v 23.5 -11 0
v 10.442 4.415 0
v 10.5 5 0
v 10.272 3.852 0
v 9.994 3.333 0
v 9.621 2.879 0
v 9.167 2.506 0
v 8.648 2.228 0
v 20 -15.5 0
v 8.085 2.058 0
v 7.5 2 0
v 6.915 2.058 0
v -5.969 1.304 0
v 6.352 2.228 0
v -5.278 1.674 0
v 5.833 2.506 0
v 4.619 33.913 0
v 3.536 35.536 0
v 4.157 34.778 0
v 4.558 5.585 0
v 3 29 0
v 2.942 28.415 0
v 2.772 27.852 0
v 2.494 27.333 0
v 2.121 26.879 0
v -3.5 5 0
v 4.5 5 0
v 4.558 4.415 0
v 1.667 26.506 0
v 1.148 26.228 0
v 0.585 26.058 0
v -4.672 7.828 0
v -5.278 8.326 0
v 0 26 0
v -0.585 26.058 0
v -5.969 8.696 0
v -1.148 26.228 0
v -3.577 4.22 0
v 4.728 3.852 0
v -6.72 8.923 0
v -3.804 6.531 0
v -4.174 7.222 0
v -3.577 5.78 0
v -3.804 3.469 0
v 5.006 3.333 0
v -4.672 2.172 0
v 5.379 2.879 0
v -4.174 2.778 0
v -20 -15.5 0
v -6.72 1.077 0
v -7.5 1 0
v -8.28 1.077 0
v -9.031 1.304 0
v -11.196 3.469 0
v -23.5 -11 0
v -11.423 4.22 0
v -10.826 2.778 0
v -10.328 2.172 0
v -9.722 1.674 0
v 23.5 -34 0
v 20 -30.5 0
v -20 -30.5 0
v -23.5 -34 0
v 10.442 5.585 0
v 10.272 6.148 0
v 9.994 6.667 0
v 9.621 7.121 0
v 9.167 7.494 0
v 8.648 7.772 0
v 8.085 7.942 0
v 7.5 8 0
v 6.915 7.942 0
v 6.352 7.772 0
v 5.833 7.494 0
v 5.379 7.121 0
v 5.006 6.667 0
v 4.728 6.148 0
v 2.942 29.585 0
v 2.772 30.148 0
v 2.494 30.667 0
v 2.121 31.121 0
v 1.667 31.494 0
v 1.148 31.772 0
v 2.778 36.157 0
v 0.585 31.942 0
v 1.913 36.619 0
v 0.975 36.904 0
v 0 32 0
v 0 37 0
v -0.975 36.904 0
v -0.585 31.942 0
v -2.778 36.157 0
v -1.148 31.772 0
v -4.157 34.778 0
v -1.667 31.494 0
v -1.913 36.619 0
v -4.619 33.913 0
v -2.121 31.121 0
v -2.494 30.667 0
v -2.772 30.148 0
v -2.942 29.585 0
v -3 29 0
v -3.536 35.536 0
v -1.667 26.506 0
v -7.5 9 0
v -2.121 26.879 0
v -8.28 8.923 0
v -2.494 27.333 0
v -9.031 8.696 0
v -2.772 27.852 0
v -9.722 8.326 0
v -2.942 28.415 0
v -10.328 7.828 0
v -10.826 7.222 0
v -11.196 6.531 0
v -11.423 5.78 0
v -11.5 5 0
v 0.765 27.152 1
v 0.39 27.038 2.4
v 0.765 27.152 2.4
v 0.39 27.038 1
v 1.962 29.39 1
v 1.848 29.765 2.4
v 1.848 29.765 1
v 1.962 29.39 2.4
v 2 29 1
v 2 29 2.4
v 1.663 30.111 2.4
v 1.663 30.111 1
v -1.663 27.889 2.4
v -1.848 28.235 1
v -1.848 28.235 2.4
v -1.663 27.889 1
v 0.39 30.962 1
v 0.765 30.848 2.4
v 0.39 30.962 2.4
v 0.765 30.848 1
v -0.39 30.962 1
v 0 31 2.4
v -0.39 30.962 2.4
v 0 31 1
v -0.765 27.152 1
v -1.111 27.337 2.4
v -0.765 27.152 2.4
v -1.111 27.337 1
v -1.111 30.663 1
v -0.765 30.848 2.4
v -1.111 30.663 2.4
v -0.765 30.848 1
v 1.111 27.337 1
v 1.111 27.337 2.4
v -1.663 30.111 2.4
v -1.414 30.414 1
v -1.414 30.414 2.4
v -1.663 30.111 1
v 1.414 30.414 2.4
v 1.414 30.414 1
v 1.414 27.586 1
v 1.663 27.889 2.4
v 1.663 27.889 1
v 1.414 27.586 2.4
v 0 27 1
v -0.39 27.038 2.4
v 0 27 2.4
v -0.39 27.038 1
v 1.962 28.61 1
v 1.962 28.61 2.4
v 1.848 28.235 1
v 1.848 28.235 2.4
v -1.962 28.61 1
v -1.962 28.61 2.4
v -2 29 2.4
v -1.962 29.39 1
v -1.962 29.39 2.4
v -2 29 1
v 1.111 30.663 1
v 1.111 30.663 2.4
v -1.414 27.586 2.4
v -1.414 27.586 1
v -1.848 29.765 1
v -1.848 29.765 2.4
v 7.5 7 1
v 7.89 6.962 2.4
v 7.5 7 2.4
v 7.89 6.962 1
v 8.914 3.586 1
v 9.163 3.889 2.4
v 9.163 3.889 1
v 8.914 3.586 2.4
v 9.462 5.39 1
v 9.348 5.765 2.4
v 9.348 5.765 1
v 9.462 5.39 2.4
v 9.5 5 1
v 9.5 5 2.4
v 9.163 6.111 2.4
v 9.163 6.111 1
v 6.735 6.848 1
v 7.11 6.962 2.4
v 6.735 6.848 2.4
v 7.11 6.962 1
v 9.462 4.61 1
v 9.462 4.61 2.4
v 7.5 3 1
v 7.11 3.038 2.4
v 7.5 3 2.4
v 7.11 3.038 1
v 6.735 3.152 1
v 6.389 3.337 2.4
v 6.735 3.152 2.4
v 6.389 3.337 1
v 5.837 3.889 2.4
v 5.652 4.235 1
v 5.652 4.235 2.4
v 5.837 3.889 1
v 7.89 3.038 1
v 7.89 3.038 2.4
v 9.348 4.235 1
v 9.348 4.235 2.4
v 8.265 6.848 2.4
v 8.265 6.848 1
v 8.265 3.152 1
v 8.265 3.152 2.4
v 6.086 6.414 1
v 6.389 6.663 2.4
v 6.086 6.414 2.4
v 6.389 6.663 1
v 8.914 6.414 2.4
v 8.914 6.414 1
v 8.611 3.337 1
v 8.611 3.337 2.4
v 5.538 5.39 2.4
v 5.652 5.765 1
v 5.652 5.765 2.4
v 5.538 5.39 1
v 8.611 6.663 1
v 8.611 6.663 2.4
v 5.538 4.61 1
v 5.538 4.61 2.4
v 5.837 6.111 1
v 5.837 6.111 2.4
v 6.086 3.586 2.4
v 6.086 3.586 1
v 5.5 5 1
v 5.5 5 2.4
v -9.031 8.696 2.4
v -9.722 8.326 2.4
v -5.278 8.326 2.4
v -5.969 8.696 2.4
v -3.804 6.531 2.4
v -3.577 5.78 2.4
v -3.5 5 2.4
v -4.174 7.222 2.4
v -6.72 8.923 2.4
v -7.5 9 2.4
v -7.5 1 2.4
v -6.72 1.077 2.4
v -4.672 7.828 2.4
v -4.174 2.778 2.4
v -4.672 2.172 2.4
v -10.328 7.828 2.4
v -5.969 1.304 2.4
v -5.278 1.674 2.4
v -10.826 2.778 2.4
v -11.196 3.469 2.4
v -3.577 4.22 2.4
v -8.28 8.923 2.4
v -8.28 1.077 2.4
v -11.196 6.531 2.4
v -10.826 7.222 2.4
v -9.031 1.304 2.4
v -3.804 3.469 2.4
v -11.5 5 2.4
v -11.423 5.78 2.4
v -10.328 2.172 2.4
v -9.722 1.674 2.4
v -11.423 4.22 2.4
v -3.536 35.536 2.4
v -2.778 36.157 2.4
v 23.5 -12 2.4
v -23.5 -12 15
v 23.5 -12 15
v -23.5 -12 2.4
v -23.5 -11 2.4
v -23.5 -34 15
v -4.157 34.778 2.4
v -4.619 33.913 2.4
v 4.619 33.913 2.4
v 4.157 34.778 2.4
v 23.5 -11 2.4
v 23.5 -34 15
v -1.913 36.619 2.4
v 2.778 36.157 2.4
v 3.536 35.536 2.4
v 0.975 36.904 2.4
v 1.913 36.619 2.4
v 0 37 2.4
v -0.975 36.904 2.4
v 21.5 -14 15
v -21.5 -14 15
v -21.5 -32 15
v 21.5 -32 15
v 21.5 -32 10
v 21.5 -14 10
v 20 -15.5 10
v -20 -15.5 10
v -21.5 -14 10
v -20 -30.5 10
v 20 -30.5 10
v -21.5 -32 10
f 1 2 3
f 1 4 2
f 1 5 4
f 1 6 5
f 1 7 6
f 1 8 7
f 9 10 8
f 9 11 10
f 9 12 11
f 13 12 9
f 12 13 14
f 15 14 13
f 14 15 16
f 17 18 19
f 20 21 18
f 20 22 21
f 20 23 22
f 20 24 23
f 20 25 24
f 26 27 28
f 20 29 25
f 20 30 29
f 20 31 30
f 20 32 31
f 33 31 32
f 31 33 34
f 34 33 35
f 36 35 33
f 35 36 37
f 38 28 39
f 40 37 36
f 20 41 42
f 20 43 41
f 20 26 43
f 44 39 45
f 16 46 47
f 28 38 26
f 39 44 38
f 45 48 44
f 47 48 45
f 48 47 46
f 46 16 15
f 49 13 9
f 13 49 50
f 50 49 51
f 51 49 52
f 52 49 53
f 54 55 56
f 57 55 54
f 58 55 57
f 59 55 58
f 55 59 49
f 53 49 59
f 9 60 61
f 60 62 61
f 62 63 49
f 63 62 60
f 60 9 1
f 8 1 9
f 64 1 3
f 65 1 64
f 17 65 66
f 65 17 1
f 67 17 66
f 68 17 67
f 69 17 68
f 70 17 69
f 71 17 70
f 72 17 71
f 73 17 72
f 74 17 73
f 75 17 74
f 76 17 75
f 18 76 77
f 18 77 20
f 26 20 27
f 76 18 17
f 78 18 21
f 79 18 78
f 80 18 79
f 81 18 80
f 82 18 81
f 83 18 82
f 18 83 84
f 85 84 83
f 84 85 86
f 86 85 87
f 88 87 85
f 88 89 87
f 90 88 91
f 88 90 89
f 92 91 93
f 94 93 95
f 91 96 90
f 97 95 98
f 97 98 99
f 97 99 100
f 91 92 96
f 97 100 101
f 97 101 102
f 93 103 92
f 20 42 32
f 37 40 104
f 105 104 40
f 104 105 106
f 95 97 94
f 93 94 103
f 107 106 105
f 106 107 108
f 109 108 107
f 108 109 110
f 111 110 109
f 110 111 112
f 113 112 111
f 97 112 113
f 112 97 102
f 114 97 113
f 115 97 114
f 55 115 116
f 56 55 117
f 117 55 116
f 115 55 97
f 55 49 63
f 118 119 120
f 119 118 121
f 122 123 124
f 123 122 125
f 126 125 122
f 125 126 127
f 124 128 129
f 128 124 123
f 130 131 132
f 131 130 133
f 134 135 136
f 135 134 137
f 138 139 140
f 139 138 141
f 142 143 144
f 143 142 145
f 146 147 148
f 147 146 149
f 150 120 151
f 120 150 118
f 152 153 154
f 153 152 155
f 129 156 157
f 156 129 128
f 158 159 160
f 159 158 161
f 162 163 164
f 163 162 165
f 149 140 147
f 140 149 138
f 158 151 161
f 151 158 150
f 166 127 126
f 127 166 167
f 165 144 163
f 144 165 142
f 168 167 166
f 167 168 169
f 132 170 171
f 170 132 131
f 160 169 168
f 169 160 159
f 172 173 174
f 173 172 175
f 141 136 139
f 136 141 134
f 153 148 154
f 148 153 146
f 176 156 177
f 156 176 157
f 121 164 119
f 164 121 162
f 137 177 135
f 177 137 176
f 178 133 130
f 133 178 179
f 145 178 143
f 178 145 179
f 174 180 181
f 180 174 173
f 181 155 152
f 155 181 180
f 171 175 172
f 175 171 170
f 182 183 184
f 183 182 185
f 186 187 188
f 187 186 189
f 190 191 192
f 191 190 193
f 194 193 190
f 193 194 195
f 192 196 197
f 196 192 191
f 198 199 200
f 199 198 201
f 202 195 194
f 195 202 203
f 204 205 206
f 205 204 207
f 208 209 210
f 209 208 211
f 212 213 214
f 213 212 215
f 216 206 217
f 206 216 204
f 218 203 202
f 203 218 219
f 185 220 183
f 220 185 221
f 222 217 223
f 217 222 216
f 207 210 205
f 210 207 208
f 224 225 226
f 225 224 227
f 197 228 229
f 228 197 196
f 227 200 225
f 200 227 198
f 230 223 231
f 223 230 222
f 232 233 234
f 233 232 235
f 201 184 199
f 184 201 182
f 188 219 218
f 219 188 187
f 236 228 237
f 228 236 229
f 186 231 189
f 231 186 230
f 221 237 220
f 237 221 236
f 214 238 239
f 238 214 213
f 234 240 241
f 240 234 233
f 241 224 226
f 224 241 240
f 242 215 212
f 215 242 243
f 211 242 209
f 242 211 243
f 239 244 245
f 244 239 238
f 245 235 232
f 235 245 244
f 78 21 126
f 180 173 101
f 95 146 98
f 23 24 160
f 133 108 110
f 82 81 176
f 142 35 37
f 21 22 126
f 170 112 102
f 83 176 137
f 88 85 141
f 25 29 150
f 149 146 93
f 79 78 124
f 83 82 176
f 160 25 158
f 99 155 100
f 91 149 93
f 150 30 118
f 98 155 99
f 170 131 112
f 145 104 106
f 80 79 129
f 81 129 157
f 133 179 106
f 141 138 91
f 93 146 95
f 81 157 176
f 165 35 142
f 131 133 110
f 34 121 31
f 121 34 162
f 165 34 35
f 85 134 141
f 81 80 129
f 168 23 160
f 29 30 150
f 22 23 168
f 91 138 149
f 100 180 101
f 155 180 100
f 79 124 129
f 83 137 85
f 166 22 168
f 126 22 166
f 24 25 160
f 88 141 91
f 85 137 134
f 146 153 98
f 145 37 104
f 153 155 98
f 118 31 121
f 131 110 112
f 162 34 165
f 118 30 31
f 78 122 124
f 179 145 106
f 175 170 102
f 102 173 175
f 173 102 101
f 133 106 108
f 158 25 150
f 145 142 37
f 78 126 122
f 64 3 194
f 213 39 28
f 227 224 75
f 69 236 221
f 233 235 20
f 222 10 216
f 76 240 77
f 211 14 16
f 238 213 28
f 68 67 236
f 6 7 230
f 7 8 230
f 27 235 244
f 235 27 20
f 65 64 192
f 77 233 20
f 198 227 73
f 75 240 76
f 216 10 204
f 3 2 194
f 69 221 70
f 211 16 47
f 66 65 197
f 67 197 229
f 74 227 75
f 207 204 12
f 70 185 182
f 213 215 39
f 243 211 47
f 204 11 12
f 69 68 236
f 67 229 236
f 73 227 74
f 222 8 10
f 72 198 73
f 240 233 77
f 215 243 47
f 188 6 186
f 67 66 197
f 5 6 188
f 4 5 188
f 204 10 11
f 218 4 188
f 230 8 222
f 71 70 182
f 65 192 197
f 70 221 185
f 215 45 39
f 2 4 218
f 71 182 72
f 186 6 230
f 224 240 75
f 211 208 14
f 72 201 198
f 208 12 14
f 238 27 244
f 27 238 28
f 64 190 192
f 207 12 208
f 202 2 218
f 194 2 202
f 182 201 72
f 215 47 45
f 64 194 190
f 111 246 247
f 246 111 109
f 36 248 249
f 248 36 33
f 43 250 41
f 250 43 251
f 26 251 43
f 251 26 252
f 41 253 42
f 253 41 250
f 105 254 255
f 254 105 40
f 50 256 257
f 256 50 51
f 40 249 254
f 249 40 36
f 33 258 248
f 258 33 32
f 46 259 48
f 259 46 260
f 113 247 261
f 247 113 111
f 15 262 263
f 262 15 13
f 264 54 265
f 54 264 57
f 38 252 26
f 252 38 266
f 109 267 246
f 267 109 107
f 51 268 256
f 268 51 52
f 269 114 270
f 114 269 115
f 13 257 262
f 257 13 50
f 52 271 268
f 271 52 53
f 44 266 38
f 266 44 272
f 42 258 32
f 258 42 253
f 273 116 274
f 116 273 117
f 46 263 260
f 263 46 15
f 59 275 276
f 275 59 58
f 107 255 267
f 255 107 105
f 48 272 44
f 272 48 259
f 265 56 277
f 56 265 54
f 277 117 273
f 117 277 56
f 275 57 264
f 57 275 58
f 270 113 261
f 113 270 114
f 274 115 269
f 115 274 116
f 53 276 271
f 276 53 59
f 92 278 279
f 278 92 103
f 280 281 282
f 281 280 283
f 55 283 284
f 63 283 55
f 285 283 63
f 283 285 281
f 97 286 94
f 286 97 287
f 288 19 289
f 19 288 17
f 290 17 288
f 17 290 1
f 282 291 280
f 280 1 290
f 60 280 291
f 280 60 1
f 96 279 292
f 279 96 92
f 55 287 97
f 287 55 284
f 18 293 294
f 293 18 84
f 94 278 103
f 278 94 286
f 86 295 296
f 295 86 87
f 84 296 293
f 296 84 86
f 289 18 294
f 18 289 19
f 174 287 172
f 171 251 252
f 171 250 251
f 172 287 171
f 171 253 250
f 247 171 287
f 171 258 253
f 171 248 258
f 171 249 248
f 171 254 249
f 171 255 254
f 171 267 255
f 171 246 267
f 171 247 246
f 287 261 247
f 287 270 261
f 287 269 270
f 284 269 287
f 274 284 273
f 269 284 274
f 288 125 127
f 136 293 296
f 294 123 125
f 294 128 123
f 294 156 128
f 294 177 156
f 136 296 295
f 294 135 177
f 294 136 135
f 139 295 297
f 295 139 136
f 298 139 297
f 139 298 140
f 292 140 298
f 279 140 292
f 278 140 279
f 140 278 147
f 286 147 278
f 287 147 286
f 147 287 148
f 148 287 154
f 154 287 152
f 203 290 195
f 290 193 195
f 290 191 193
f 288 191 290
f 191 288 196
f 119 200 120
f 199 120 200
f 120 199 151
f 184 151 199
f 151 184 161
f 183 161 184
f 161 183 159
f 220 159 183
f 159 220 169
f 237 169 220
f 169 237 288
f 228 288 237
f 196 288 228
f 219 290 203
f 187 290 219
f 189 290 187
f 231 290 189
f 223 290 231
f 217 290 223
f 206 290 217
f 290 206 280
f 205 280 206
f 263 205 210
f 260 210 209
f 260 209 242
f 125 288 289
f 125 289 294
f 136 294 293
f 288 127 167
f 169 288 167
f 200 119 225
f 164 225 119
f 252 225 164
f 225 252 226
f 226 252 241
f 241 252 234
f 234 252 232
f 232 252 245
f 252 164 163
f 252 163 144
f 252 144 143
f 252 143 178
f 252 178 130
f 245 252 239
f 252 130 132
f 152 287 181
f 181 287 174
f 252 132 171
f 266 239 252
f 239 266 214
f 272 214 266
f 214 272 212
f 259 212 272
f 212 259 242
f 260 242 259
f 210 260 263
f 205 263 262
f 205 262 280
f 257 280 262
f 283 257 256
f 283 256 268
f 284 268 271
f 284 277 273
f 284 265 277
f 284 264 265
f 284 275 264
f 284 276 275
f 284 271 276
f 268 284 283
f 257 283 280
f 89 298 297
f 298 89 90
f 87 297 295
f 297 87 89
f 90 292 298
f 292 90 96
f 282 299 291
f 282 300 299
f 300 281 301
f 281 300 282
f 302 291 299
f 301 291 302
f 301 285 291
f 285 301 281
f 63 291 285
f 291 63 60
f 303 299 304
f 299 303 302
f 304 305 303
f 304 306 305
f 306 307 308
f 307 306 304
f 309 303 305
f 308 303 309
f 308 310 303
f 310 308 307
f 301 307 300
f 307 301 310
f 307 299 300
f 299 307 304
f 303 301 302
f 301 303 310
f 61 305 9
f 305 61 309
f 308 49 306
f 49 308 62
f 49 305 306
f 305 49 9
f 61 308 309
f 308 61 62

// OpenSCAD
$fn = 32;

/* include <brush.scad> */

/* render_brush = false; */

tolerance = 0.5;

width = 18;
length = 43;
box_height = 15;
height = 2;
filet = 5;

box_thicknes=2;


outer_width = width+(box_thicknes*2);
outer_length = length+(box_thicknes*2);

gap_depth=5;
gap_size=1.5;

module box() {
    difference() {
        cube([outer_length, outer_width, box_height]);

        translate([box_thicknes, box_thicknes, box_height - gap_depth])
            cube([length, width, box_height]);

        translate([box_thicknes+gap_size, box_thicknes+gap_size, -1])
            cube([length-(gap_size*2), width-(gap_size*2), box_height]);
    }
}

module mount() {
    distance1 = 24;
    distance2 = 32;
    filet = 5;
    height = 2.4;

    difference() {
        translate([-distance1/2, 0, 0]) {
            hull() {
                translate([(-distance1/2)+0.5, -12, 0])
                    cube([outer_length, 1, height]);

                cylinder(h=height, r=filet);
                translate([distance1/2, distance2, 0])
                    cylinder(h=height, r=filet);
                translate([distance1, 0, 0])
                    cylinder(h=height, r=filet);
            }
        }
        translate([0, filet, 0])
        mount_holes();
    }
}
module mount_holes() {
    distance1 = 15;
    distance2 = 24;
    hole_r = 2;
    height = 5;

    skip_one_hole = true;

    translate([-distance1/2, 0, 0]) {
        cylinder(h=height, r=hole_r);
        translate([distance1/2, distance2, 0])
            cylinder(h=height, r=hole_r);
        translate([distance1, 0, 0])
            cylinder(h=height, r=hole_r);

        // filet
        cylinder(h=1, r=hole_r+1, r2=hole_r);
        translate([distance1/2, distance2, 0])
            cylinder(h=1, r=hole_r+1, r2=hole_r);
        translate([distance1, 0, 0])
            cylinder(h=1, r=hole_r+1, r2=hole_r);

        if (skip_one_hole) {
            cylinder(h=height, r=hole_r*2);
        }
    }
}

difference() {
    union() {
        mount();
        translate([-outer_length/2, -34, 0]) {
            box();
        }
    }
}
